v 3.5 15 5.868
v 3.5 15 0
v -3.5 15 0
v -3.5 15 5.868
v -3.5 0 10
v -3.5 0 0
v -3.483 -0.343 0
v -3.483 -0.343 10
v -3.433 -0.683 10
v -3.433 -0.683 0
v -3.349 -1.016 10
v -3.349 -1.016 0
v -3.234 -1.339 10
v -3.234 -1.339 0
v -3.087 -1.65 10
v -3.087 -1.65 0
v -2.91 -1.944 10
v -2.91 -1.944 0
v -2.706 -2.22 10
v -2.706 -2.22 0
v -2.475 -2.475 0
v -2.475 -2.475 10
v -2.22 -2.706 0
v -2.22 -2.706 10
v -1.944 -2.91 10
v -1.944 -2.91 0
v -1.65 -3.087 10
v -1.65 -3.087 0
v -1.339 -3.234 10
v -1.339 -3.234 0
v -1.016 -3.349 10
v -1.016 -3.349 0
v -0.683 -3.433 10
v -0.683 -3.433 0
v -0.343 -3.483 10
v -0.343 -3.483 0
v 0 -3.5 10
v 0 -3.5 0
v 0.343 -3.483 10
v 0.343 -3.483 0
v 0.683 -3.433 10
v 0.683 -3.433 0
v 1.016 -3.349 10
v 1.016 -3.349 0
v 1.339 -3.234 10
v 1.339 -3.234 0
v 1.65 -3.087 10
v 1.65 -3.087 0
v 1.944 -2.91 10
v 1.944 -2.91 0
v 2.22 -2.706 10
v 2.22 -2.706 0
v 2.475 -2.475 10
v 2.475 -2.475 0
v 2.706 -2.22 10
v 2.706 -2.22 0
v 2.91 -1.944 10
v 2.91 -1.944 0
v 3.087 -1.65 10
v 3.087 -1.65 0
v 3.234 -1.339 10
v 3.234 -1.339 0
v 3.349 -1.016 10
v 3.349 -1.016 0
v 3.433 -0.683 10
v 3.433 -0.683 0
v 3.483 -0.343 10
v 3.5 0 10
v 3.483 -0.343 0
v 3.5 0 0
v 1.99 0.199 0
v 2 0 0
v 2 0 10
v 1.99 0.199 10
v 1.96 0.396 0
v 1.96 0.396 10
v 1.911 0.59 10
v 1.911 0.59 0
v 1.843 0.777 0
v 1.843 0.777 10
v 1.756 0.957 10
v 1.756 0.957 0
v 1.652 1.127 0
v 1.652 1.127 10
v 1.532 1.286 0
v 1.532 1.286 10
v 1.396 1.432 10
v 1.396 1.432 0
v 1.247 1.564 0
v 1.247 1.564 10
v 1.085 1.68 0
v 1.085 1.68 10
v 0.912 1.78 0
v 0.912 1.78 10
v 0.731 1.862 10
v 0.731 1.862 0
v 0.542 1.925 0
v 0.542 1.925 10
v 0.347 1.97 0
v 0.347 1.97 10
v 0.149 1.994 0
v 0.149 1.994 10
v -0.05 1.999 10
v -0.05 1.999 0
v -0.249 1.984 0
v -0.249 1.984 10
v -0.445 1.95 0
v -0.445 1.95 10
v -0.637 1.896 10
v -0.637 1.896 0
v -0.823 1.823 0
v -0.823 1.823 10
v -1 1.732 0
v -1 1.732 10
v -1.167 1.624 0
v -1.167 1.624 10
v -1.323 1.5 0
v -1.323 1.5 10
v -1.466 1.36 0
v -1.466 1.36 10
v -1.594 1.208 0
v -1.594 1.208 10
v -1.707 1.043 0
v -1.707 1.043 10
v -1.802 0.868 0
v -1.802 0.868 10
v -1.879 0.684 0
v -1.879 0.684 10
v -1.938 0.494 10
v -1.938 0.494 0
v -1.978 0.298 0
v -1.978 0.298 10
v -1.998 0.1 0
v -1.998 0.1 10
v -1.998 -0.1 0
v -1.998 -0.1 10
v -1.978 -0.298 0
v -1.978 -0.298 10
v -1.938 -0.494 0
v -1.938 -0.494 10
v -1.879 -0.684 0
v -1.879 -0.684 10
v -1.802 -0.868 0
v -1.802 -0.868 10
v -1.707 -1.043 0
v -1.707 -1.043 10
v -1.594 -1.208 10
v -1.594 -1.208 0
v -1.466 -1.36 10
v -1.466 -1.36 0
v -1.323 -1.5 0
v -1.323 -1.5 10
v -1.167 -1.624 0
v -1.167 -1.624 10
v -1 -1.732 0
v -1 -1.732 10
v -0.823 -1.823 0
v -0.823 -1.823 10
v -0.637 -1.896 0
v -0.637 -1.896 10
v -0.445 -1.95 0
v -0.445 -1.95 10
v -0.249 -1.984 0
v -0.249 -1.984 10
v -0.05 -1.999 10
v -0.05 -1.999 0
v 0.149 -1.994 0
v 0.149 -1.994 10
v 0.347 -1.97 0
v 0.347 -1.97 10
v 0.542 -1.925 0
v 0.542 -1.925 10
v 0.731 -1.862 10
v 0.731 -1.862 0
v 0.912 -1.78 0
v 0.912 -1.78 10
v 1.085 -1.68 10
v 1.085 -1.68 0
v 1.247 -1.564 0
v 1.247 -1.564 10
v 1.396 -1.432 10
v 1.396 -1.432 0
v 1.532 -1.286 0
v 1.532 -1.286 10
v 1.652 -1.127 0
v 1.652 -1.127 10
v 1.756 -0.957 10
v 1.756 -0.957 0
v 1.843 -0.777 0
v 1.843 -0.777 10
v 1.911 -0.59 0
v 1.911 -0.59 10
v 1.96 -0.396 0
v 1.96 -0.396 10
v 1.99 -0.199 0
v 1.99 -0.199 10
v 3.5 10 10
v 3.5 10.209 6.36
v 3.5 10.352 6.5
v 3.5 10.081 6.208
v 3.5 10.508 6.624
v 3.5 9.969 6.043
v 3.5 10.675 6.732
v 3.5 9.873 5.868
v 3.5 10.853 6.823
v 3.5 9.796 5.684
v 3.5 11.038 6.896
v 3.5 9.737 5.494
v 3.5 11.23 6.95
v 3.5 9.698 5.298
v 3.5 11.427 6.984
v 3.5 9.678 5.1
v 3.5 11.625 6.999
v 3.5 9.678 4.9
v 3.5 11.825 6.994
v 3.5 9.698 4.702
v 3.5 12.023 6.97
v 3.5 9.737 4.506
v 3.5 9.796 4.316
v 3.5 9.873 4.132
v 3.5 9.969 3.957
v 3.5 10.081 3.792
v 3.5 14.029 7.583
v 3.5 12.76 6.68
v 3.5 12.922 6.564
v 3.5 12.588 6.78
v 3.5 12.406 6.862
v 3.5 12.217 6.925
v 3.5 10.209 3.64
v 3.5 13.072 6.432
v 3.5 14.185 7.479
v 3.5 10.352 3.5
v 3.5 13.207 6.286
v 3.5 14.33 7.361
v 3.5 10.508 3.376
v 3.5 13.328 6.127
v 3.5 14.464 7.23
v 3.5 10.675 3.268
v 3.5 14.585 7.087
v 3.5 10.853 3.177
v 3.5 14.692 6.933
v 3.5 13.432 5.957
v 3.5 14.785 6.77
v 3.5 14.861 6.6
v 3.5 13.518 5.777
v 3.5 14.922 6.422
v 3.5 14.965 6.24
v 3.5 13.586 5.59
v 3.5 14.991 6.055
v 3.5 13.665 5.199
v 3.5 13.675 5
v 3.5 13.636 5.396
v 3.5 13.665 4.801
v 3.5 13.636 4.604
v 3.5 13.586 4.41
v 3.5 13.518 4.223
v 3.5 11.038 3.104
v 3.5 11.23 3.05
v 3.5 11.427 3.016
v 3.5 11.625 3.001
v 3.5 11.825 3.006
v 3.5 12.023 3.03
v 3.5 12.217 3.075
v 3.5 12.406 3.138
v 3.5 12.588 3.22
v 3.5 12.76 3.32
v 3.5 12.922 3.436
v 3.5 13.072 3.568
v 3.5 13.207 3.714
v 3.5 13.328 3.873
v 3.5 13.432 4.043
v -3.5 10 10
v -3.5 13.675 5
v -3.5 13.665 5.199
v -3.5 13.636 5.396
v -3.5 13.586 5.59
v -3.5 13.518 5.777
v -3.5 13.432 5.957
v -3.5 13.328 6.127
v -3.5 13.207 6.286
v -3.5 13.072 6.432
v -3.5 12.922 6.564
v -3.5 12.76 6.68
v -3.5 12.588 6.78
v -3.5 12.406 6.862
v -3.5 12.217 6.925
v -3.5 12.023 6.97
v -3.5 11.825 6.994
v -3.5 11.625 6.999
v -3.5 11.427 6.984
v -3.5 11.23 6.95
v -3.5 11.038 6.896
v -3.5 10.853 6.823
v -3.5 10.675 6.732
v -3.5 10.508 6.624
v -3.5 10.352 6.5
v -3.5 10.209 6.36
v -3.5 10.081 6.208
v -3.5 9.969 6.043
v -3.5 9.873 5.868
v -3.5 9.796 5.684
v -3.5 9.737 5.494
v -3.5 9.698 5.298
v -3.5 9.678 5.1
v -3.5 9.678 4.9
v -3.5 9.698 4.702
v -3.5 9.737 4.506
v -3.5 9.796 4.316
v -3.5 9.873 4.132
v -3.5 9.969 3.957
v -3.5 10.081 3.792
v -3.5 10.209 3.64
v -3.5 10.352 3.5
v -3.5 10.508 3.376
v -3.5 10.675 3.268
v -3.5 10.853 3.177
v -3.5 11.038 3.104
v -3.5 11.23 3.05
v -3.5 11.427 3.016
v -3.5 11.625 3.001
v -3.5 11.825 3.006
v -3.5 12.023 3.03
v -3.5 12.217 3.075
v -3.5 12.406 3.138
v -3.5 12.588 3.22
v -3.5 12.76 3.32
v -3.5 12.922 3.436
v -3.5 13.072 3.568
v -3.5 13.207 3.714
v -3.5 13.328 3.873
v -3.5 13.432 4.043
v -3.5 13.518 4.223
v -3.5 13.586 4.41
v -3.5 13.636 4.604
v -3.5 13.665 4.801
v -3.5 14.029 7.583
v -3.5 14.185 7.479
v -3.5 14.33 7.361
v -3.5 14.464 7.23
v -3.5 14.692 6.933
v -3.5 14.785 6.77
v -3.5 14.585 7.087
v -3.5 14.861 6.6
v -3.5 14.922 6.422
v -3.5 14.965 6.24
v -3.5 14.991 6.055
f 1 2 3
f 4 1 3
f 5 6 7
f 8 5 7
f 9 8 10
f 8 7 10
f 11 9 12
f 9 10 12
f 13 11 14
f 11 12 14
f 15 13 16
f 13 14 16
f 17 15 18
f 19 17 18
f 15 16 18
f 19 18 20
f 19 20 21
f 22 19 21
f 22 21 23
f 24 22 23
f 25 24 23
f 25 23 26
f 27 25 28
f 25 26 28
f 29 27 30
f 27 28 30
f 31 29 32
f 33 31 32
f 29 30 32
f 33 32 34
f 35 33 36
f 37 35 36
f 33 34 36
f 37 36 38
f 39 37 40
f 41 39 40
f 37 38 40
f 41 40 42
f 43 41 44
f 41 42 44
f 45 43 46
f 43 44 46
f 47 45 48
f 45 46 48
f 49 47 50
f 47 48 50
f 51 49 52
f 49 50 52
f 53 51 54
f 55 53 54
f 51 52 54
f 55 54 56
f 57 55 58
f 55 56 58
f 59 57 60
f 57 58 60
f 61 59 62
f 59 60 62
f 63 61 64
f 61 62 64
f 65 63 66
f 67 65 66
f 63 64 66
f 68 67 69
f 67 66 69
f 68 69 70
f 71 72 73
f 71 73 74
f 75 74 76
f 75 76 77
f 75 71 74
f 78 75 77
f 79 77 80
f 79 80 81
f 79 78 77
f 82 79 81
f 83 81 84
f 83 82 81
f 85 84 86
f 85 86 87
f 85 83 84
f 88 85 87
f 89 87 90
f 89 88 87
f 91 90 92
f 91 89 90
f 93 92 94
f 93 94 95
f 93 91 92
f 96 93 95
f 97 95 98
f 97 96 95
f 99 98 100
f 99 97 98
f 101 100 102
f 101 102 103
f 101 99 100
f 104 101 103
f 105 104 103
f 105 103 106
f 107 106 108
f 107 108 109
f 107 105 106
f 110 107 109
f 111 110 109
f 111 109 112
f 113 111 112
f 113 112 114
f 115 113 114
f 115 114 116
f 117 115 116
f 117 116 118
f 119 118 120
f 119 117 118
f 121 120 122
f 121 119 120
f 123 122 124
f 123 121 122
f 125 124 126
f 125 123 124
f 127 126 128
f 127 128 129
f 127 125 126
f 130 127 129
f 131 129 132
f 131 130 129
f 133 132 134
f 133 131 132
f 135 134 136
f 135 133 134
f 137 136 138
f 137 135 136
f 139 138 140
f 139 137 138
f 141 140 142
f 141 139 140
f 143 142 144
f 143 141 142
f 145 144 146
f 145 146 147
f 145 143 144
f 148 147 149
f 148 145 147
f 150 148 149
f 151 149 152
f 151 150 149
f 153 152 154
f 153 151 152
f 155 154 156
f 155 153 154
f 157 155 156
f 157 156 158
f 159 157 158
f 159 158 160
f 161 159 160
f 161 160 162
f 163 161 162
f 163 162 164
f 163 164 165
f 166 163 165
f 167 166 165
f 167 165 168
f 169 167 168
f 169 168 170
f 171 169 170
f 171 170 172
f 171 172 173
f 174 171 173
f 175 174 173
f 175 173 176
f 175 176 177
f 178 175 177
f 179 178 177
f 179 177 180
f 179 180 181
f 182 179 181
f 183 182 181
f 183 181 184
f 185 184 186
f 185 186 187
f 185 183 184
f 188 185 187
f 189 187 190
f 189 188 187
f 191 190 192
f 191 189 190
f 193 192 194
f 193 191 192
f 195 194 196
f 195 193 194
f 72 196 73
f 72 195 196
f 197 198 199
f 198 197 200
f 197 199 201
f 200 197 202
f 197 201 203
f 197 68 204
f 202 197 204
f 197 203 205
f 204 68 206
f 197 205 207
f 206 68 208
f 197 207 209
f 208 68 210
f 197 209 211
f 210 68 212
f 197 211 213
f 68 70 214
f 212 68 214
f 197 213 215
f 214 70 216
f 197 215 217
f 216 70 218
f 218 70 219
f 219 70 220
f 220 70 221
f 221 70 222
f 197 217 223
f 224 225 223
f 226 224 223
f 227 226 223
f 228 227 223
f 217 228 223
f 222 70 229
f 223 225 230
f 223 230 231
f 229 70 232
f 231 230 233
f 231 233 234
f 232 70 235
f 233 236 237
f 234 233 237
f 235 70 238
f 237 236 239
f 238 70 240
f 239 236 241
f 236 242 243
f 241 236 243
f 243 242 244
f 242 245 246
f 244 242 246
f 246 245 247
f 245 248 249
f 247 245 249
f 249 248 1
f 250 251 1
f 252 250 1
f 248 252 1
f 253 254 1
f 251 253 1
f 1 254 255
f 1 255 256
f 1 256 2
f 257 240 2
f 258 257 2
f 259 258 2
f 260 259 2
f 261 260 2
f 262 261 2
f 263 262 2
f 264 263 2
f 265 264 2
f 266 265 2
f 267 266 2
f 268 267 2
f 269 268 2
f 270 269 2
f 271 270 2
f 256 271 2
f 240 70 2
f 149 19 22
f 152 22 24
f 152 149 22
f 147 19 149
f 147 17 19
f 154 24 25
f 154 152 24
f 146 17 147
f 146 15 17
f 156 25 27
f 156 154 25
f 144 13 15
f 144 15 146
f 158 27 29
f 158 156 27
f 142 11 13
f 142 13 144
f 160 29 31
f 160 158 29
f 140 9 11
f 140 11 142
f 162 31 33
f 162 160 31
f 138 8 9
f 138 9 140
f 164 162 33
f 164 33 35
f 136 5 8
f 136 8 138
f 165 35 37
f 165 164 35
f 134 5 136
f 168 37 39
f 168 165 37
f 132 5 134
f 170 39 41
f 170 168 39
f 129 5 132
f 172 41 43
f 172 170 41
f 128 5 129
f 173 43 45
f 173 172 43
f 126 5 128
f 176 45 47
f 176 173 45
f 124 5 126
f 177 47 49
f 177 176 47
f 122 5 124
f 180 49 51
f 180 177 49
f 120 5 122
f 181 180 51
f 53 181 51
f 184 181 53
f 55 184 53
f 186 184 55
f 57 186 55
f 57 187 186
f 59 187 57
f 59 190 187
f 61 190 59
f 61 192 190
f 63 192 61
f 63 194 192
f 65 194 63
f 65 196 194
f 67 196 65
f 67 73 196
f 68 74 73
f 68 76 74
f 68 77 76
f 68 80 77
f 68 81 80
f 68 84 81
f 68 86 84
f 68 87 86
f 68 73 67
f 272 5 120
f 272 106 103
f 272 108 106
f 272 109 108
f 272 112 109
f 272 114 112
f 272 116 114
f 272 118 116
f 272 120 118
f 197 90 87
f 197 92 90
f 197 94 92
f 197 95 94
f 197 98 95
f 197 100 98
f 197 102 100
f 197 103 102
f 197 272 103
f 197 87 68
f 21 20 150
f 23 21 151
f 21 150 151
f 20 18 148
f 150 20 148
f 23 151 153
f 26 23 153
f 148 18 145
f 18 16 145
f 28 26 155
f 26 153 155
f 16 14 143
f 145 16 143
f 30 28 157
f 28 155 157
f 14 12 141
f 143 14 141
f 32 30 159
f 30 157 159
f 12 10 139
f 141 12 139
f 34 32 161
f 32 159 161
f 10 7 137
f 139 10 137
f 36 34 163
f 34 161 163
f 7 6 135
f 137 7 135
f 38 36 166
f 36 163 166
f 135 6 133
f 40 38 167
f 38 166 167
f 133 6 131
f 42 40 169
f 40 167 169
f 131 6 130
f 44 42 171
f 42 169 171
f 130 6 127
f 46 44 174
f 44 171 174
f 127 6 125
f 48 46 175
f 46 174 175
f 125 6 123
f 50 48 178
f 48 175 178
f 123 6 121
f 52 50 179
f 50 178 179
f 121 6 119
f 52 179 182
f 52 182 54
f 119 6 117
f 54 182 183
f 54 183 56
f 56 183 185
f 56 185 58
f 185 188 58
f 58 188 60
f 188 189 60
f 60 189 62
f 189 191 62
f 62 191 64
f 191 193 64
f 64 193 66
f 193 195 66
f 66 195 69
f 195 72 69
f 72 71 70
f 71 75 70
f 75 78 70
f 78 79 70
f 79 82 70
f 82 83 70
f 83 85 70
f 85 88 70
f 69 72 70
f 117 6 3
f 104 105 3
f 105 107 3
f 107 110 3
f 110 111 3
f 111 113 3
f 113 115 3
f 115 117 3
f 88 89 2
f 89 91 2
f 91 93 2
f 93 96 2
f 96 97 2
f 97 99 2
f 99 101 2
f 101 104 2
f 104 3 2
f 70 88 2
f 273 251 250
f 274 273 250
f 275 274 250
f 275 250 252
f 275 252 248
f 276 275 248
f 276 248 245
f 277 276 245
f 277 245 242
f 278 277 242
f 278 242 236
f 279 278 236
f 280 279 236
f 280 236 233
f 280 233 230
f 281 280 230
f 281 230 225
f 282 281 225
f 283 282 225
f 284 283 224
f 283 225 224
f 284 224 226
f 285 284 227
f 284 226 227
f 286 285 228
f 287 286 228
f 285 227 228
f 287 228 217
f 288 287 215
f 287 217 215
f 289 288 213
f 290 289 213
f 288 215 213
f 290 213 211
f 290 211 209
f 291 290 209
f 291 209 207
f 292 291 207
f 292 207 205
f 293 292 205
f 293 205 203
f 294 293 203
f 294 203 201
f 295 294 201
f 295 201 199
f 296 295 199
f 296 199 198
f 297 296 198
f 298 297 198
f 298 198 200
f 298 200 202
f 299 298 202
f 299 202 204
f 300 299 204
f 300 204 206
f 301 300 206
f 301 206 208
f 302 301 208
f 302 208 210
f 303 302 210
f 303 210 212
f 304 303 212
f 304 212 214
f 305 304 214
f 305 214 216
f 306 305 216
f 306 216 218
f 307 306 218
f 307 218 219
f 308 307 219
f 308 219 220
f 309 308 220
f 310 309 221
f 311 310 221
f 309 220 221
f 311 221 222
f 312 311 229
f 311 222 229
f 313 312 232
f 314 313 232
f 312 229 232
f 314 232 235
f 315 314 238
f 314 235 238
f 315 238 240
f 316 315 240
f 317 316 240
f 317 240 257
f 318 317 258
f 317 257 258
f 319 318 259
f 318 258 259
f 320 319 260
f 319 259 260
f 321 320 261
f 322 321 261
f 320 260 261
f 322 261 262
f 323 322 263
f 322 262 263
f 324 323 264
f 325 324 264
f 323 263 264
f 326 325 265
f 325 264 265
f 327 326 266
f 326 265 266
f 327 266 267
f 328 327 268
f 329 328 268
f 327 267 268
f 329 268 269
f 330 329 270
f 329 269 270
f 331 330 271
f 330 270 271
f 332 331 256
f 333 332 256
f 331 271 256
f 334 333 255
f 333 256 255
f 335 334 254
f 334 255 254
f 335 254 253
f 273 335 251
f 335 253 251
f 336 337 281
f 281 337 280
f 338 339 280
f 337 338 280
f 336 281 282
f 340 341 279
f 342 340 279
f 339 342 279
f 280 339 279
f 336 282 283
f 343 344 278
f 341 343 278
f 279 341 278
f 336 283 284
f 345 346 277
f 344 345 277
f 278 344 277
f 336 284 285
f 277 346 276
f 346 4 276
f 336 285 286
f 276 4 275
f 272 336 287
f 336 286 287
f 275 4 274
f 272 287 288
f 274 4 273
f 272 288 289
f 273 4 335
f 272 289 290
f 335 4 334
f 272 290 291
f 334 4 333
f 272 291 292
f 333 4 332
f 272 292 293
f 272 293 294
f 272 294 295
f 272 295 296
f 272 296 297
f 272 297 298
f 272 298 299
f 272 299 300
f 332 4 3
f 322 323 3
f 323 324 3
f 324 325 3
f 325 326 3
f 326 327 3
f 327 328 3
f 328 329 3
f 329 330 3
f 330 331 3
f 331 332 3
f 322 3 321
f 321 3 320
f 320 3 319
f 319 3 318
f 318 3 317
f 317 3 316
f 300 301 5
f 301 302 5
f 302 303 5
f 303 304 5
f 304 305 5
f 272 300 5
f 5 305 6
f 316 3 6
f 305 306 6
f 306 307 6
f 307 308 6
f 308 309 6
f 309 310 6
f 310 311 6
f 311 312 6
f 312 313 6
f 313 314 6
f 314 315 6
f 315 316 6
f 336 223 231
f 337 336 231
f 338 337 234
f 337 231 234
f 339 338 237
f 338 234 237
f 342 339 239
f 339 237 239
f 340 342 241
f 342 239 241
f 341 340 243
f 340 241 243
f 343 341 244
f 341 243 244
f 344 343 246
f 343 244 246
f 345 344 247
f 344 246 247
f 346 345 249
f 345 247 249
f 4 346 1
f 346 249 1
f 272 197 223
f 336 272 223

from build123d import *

# Parameters (mm, degrees)
F0_R     = 2
F1_DEPTH = 10
F2_R     = 2
F3_DEPTH = 25


# Not quite as in the source:
# - a feature names something its author has since deleted; it is built from what else it names


with BuildPart() as f1:
    # F0 (on Top) → F1 (new body)
    with BuildSketch(Plane.XY):
        with BuildLine():
            Line((-3.5, 15), (-3.5, 0))
            ThreePointArc((-3.5, 0), (0, -3.5), (3.5, 0))
            Line((3.5, 0), (3.5, 15))
            Line((3.5, 15), (-3.5, 15))
        make_face()
        Circle(F0_R, mode=Mode.SUBTRACT)
    extrude(amount=F1_DEPTH)

    # F2 (on face) → F3 (cut)
    with BuildSketch(Plane.YZ.offset(3.5)):
        with Locations((11.6752159595, 5)):
            Circle(F2_R)
        with BuildLine():
            ThreePointArc((14.028986054, 7.5826258022), (14.7403982458, 6.8530370755), (15, 5.8676366767))
            Line((15, 5.8676366767), (15, 10))
            Line((15, 10), (10, 10))
            Line((10, 10), (14.028986054, 7.5826258022))
        make_face()
    extrude(amount=-F3_DEPTH, mode=Mode.SUBTRACT)


solid = f1.part
